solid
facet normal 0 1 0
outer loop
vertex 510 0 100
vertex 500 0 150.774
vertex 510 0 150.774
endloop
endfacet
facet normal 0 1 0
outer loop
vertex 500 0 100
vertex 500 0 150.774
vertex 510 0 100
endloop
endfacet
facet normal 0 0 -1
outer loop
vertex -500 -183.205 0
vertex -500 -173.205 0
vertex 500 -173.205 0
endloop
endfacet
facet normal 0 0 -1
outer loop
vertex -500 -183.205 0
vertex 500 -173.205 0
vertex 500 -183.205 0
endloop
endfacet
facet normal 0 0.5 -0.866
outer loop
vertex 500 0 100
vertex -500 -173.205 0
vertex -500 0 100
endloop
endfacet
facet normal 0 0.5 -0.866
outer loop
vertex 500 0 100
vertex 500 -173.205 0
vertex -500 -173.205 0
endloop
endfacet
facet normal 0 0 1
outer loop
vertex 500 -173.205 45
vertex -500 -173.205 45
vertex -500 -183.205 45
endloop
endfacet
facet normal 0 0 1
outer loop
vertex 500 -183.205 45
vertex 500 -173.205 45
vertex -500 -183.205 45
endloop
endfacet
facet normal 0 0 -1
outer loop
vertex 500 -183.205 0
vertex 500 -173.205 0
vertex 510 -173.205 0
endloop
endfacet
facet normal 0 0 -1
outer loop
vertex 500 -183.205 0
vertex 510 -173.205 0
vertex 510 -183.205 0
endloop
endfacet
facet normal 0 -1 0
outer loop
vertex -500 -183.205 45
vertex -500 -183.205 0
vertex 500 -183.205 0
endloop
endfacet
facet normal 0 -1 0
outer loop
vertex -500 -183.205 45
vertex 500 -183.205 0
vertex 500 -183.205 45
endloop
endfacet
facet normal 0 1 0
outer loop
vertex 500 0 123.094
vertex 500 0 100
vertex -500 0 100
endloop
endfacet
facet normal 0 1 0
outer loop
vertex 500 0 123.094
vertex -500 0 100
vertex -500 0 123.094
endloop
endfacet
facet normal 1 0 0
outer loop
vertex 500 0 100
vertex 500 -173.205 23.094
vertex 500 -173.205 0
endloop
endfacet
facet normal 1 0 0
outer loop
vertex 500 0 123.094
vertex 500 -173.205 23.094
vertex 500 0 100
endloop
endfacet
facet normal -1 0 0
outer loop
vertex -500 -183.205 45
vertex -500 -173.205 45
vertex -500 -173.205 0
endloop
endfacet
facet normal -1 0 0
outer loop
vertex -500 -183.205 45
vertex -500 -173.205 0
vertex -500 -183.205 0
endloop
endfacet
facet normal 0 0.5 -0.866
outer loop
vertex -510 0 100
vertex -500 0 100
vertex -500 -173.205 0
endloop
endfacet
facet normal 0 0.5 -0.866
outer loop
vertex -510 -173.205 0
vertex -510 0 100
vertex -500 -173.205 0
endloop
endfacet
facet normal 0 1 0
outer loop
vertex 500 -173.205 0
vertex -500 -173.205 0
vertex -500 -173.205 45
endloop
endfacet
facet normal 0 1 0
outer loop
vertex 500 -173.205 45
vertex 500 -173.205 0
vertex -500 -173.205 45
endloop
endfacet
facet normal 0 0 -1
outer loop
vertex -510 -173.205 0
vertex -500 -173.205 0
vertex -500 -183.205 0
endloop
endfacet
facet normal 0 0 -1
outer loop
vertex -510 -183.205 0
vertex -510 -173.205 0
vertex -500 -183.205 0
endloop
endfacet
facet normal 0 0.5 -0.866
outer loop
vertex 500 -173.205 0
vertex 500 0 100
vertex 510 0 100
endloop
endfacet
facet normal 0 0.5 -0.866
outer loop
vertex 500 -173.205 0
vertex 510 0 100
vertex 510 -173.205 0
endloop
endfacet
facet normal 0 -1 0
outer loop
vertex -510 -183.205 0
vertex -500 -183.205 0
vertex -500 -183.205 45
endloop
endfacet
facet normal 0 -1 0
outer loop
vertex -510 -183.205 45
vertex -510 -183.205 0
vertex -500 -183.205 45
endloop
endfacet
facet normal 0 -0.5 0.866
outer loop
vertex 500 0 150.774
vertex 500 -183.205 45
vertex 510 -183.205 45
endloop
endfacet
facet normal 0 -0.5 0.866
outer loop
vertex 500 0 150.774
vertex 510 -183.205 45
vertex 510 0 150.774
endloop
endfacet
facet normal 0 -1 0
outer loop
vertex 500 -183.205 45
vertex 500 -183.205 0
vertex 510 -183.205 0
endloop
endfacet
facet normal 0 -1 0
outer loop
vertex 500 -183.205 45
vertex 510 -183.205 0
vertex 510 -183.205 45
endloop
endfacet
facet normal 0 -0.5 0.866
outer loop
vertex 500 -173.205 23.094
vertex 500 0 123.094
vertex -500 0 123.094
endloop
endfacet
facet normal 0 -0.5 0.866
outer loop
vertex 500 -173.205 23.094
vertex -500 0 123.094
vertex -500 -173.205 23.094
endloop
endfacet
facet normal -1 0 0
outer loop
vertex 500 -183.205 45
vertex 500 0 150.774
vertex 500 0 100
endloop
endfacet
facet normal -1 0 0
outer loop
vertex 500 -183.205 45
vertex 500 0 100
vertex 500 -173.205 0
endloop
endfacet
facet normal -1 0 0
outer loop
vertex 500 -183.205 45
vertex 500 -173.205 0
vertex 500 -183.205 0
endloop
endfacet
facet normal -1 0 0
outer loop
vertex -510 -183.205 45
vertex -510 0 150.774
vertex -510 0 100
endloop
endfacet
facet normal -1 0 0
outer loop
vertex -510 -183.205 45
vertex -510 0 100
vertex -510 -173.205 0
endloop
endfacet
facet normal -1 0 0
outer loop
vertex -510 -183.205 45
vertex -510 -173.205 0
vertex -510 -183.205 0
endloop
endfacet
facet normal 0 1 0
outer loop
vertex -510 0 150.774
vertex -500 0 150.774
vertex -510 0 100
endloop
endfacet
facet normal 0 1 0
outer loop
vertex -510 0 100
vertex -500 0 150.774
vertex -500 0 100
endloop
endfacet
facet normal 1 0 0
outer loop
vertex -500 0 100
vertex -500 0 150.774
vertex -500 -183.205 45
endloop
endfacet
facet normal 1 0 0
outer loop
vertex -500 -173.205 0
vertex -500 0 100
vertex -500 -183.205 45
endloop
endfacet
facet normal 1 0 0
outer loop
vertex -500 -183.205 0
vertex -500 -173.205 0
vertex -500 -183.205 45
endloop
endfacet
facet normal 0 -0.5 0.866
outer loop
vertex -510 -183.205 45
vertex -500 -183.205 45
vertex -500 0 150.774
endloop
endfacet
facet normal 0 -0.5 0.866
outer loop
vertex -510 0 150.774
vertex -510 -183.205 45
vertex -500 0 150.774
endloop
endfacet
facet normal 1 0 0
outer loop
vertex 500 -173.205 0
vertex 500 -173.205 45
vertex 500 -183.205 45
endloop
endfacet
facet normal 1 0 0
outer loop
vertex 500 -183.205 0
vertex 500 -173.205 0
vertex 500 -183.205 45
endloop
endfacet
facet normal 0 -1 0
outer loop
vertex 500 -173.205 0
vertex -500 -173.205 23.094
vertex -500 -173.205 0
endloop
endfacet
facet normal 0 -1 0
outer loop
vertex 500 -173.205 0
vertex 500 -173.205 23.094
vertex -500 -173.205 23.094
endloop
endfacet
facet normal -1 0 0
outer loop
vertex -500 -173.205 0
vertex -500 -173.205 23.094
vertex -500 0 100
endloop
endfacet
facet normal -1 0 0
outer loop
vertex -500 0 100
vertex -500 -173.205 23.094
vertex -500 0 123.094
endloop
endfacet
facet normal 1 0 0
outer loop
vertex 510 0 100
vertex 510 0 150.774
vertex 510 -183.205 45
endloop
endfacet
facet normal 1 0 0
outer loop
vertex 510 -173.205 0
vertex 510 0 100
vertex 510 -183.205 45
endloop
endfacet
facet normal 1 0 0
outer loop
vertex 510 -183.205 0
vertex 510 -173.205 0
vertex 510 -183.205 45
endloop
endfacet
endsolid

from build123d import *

# Parameters (mm, degrees)
F1_DEPTH = 500
F2_W     = 10
F2_H     = 45
F3_DEPTH = 1000
F5_DEPTH = 10


with BuildPart() as f1:
    # F0 (on Right) → F1 (new body, symmetric)
    with BuildSketch(Plane.YZ):
        Polygon((-173.205081, 0), (0, 100), (0, 123.094011), (-173.205081, 23.094011), align=None)
    extrude(amount=F1_DEPTH, both=True)


with BuildPart() as f3:
    # F2 (on face) → F3 (new body)
    with BuildSketch(Plane(origin=(-500, 0, 0), x_dir=(0, -1, 0), z_dir=(-1, 0, 0))):
        with Locations((178.205081, 22.5)):
            Rectangle(F2_W, F2_H)
    extrude(amount=-F3_DEPTH)


with BuildPart() as f5:
    # F4 (on face) → F5 (new body)
    with BuildSketch(Plane(origin=(-500, 0, 0), x_dir=(0, -1, 0), z_dir=(-1, 0, 0))):
        Polygon((0, 150.773503), (0, 100), (173.205081, 0), (183.205081, 0), (183.205081, 45), align=None)
    extrude(amount=F5_DEPTH)


with BuildPart() as f6_1:
    # F6: instance of F5
    add(f5.part.mirror(Plane.YZ))


solid = Compound([f1.part, f3.part, f5.part, f6_1.part])
